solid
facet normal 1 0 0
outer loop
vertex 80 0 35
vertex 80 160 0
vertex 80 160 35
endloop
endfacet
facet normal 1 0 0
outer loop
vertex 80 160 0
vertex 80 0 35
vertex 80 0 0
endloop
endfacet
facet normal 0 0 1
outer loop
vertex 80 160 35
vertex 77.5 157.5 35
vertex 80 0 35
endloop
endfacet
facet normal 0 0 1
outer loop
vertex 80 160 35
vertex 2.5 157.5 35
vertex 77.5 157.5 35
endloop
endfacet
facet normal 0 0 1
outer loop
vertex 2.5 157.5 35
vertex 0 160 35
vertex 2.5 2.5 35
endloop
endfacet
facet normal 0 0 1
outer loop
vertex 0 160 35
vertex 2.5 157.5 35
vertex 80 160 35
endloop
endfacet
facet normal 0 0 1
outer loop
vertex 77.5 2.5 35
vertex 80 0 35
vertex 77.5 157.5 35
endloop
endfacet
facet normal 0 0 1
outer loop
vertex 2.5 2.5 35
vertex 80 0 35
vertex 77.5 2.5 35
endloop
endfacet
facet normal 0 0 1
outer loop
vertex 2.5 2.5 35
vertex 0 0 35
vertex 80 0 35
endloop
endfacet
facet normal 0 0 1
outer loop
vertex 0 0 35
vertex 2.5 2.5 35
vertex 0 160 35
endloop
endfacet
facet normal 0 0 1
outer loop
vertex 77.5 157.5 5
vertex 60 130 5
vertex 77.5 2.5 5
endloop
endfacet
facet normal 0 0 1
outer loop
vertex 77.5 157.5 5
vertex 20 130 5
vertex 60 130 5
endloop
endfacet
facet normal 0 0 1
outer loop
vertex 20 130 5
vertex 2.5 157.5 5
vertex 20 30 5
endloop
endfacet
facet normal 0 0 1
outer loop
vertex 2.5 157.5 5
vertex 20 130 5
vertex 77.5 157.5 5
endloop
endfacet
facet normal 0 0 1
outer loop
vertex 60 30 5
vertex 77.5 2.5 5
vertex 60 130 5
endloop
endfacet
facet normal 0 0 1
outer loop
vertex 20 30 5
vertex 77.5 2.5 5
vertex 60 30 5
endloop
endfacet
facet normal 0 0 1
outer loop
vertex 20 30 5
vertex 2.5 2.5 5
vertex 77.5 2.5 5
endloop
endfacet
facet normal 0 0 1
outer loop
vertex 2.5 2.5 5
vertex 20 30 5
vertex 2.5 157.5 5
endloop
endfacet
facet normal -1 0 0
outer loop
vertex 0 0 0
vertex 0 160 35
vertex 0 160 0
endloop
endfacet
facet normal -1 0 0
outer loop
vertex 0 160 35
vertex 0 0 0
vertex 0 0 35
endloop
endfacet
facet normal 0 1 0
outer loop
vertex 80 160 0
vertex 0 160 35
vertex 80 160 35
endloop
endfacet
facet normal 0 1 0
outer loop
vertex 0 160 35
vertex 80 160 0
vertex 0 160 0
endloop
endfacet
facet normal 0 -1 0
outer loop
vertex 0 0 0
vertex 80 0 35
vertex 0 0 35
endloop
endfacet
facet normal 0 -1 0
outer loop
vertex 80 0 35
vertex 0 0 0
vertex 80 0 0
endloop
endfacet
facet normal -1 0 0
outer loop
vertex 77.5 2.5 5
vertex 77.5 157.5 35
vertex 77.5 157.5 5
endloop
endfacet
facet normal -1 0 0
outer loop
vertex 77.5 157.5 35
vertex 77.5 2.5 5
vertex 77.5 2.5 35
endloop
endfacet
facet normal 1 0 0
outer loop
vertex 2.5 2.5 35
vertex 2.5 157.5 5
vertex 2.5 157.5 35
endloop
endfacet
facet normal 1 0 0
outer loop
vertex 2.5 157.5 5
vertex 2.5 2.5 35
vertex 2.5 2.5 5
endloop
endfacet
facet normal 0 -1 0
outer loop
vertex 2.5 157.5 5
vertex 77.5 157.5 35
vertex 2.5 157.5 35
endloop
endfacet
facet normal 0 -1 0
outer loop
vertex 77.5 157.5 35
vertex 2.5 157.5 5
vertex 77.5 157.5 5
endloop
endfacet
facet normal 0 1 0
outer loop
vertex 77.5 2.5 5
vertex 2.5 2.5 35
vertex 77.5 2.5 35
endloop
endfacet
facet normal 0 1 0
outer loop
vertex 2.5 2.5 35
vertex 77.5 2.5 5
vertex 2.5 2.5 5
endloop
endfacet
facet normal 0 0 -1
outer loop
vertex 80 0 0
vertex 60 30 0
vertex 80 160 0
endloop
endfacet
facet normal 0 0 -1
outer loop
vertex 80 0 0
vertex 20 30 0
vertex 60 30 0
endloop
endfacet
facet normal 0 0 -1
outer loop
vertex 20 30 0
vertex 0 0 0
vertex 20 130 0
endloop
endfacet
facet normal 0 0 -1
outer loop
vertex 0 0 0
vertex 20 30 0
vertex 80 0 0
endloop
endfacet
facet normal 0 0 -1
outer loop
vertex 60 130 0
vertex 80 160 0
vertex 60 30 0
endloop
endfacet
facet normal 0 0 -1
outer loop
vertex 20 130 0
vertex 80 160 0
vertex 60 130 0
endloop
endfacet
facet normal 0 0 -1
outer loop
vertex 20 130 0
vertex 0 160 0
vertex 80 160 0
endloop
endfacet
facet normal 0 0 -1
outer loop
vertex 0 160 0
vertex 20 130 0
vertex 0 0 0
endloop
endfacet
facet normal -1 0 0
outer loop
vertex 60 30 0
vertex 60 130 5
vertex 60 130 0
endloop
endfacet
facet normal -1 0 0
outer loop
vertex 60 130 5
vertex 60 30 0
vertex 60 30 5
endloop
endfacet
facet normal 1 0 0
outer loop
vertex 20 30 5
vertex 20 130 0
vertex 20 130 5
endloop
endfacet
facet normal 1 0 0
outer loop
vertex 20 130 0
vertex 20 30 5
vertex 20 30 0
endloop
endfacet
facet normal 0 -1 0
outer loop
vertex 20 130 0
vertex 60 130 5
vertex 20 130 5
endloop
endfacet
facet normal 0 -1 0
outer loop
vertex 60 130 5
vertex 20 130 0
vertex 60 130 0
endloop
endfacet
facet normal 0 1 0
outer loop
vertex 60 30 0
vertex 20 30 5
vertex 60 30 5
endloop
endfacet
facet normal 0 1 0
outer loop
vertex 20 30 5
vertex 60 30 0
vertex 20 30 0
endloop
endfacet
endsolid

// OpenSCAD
// [FL_INDEX: keywords="openscad, 3d_parametric, Customizable_LCD_Box, csg_solid" | COT="Parametric OpenSCAD design from 3DCodeverse"]
// Title: Customizable LCD Box

// Customizable LCD Holder Box
// 2013 Frank Avery
// dieselpoweredrobotics.com

//Settable Variables

// Defines the length of the box
box_length = 160; // Numeric vaue highter than Screen Length

// Defines the width of the box
box_width = 80; // Numeric value higher than Screen Width

// Defines the LCD screen length
screen_length = 100; // Numeric value smaller than Box Length

// Defines the LCD screen height
screen_width = 40; // Numeric value smaller than Box Width

// Determines the thickness of the box walls
wall_thickness = 5; // Top may not fix if thickness is reduced below 2.

// Determines how tall the box is (height of the sidewalls)
wall_height = 30; // Any numeric value

// Generate a cover for the other side of the box
generate_top = "yes"; // [Yes,No]


//Calculated Variables
wall_offset = wall_thickness / 2;
screen_offset_y = (box_length - screen_length) / 2;
screen_offset_x = (box_width - screen_width) / 2;

module lcdbox()
{
	//lcd screen box
	module screen()
	{
		translate([screen_offset_x,screen_offset_y,-5]) 
		cube([screen_width,screen_length,30]);
	}

	//front faceplate
	module holder()
	{
		cube([box_width,box_length,wall_thickness]);
	}

	//sidewalls of the box
	module sidewalls()
	{
		difference()
		{
			translate([0,0,wall_thickness]) cube([box_width,box_length,wall_height]);
			translate([wall_offset,wall_offset,-5]) cube([box_width-wall_thickness,box_length-wall_thickness,wall_height+20]);
		}
		
	}

	//join sidewalls to difference between holder and screen
	union()
	{
		sidewalls();
		difference()
		{
			holder();
			screen();
		}
	}
}

//top to be printed
module lcdbottom()
{
	translate([-100,0,0])
	cube([box_width, box_length,wall_thickness]);

	translate([-100+wall_offset,wall_offset,wall_thickness])
	cube([box_width-wall_thickness,box_length-wall_thickness,wall_thickness]);
}

lcdbox();

if (generate_top == "Yes")
{
	lcdbottom();
}
